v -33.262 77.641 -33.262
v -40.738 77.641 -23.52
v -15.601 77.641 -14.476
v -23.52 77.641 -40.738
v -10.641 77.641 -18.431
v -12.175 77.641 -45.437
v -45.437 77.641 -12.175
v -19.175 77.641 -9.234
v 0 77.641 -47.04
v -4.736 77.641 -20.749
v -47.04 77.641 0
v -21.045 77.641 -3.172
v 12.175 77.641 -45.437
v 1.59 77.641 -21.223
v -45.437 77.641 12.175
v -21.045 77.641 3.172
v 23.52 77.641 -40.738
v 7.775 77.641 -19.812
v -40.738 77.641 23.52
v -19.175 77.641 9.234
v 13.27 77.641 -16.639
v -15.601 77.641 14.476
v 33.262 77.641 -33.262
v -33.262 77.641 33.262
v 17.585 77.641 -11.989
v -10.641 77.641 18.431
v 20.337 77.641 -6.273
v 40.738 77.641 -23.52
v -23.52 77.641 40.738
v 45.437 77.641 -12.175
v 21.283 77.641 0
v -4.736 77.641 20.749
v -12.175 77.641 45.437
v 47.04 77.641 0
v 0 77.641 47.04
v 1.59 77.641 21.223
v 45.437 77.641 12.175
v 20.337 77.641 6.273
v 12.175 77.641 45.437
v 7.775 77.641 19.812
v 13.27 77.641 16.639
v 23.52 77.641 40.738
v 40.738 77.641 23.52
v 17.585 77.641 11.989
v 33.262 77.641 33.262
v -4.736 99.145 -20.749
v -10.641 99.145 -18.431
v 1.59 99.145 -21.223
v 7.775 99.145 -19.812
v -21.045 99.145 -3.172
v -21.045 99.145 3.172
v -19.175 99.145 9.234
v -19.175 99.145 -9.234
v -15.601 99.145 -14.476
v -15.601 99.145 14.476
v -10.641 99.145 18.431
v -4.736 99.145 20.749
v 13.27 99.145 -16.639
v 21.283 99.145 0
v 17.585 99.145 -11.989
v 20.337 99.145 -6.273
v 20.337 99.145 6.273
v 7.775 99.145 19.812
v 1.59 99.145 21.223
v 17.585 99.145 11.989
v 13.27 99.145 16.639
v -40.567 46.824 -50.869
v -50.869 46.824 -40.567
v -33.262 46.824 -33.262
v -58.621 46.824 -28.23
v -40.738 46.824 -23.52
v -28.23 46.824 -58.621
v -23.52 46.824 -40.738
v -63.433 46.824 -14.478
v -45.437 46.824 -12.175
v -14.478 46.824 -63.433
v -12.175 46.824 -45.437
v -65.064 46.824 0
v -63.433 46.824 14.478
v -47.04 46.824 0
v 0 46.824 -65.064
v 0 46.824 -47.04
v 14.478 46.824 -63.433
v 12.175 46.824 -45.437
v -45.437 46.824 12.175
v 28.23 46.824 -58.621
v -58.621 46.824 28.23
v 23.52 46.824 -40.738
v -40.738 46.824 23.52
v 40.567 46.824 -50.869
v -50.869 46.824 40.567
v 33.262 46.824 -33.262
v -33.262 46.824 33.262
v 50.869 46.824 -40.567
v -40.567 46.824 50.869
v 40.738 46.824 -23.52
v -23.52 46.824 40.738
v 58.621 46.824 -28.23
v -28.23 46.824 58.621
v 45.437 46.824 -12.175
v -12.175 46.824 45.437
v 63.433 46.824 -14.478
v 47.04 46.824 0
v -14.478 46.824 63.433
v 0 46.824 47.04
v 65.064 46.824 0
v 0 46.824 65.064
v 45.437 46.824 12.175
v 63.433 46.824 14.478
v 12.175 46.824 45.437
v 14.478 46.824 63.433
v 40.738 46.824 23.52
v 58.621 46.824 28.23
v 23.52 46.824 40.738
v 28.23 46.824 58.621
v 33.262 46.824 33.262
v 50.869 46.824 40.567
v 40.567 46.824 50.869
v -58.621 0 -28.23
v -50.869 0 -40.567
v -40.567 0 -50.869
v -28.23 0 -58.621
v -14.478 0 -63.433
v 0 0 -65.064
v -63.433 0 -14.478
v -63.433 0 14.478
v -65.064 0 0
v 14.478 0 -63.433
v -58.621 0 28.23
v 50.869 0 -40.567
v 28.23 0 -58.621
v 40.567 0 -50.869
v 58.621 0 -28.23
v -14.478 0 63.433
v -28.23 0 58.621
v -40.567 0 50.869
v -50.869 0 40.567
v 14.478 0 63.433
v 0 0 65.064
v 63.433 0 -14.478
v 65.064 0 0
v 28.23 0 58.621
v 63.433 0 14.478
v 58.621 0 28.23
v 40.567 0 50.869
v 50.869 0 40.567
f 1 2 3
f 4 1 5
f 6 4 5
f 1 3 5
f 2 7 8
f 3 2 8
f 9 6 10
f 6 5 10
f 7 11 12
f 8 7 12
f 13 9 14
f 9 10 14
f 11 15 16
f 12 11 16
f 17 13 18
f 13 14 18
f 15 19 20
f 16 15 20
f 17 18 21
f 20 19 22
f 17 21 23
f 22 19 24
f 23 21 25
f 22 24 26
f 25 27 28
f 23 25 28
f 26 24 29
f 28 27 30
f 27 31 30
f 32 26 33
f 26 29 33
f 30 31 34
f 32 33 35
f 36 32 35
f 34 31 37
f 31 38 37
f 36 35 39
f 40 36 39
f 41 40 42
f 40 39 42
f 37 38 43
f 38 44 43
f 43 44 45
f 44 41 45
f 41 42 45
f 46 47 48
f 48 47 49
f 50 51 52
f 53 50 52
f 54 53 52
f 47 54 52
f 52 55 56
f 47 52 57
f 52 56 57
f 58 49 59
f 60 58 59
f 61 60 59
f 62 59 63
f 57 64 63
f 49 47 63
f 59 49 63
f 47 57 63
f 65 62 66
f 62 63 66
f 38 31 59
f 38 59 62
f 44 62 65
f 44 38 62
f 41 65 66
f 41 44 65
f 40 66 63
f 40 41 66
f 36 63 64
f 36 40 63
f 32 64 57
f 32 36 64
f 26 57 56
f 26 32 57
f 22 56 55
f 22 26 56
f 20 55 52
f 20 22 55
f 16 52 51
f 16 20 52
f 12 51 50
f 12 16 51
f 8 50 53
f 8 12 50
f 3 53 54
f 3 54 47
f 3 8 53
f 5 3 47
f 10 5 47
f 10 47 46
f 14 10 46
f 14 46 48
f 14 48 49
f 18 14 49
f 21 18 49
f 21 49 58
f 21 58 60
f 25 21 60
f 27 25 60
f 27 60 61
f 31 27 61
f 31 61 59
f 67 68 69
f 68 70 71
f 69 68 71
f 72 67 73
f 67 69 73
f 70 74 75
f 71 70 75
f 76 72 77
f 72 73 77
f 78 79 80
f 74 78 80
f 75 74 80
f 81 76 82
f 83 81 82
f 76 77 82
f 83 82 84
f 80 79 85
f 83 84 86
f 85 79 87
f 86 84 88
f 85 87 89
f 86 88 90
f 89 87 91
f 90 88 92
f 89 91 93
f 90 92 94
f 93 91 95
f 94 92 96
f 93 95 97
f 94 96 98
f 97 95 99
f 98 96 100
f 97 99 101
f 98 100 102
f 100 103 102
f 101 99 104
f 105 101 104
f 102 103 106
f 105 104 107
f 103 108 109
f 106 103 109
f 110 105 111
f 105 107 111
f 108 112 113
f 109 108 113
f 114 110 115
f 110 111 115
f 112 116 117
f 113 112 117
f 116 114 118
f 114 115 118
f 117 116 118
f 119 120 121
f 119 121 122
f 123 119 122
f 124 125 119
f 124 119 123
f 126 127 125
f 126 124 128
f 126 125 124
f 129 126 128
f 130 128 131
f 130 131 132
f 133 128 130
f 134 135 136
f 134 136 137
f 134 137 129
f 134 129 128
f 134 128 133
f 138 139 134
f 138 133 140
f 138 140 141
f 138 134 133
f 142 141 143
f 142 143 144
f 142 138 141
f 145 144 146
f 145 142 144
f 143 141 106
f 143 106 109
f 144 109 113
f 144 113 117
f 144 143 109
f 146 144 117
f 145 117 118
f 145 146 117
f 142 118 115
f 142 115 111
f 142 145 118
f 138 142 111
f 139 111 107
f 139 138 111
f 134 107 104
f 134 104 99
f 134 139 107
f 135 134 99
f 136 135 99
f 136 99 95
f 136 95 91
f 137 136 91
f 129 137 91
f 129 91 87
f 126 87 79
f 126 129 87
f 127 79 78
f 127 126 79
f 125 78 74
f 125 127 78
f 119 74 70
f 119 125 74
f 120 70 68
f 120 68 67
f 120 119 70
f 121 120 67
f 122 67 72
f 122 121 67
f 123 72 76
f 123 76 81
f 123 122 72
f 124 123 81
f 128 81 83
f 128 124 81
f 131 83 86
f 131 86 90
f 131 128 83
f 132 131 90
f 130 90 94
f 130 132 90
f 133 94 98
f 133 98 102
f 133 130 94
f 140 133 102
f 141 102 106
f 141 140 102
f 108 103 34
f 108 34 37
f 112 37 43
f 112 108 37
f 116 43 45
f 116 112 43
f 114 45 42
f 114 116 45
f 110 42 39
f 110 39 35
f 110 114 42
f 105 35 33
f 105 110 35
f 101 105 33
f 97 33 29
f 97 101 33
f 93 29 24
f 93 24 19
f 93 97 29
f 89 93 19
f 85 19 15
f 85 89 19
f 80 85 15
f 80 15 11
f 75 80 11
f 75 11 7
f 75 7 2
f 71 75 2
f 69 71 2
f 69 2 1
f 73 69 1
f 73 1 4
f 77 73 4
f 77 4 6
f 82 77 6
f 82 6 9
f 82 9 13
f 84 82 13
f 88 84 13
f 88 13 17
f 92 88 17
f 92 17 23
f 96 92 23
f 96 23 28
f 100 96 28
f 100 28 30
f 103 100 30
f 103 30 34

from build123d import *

# Parameters (mm, degrees)
F0_R     = 65.064224
F1_DEPTH = 46.824317
F2_R     = 47.040122
F3_DEPTH = 77.640906
F4_R     = 21.28271
F5_DEPTH = 99.144967


with BuildPart() as f1:
    # F0 (on Front) → F1 (new body)
    with BuildSketch(Plane.XZ):
        Circle(F0_R)
    extrude(amount=-F1_DEPTH)

    # F2 (on Front) → F3 (join)
    with BuildSketch(Plane.XZ):
        Circle(F2_R)
    extrude(amount=-F3_DEPTH)

    # F4 (on Front) → F5 (join)
    with BuildSketch(Plane.XZ):
        Circle(F4_R)
    extrude(amount=-F5_DEPTH)


solid = f1.part
